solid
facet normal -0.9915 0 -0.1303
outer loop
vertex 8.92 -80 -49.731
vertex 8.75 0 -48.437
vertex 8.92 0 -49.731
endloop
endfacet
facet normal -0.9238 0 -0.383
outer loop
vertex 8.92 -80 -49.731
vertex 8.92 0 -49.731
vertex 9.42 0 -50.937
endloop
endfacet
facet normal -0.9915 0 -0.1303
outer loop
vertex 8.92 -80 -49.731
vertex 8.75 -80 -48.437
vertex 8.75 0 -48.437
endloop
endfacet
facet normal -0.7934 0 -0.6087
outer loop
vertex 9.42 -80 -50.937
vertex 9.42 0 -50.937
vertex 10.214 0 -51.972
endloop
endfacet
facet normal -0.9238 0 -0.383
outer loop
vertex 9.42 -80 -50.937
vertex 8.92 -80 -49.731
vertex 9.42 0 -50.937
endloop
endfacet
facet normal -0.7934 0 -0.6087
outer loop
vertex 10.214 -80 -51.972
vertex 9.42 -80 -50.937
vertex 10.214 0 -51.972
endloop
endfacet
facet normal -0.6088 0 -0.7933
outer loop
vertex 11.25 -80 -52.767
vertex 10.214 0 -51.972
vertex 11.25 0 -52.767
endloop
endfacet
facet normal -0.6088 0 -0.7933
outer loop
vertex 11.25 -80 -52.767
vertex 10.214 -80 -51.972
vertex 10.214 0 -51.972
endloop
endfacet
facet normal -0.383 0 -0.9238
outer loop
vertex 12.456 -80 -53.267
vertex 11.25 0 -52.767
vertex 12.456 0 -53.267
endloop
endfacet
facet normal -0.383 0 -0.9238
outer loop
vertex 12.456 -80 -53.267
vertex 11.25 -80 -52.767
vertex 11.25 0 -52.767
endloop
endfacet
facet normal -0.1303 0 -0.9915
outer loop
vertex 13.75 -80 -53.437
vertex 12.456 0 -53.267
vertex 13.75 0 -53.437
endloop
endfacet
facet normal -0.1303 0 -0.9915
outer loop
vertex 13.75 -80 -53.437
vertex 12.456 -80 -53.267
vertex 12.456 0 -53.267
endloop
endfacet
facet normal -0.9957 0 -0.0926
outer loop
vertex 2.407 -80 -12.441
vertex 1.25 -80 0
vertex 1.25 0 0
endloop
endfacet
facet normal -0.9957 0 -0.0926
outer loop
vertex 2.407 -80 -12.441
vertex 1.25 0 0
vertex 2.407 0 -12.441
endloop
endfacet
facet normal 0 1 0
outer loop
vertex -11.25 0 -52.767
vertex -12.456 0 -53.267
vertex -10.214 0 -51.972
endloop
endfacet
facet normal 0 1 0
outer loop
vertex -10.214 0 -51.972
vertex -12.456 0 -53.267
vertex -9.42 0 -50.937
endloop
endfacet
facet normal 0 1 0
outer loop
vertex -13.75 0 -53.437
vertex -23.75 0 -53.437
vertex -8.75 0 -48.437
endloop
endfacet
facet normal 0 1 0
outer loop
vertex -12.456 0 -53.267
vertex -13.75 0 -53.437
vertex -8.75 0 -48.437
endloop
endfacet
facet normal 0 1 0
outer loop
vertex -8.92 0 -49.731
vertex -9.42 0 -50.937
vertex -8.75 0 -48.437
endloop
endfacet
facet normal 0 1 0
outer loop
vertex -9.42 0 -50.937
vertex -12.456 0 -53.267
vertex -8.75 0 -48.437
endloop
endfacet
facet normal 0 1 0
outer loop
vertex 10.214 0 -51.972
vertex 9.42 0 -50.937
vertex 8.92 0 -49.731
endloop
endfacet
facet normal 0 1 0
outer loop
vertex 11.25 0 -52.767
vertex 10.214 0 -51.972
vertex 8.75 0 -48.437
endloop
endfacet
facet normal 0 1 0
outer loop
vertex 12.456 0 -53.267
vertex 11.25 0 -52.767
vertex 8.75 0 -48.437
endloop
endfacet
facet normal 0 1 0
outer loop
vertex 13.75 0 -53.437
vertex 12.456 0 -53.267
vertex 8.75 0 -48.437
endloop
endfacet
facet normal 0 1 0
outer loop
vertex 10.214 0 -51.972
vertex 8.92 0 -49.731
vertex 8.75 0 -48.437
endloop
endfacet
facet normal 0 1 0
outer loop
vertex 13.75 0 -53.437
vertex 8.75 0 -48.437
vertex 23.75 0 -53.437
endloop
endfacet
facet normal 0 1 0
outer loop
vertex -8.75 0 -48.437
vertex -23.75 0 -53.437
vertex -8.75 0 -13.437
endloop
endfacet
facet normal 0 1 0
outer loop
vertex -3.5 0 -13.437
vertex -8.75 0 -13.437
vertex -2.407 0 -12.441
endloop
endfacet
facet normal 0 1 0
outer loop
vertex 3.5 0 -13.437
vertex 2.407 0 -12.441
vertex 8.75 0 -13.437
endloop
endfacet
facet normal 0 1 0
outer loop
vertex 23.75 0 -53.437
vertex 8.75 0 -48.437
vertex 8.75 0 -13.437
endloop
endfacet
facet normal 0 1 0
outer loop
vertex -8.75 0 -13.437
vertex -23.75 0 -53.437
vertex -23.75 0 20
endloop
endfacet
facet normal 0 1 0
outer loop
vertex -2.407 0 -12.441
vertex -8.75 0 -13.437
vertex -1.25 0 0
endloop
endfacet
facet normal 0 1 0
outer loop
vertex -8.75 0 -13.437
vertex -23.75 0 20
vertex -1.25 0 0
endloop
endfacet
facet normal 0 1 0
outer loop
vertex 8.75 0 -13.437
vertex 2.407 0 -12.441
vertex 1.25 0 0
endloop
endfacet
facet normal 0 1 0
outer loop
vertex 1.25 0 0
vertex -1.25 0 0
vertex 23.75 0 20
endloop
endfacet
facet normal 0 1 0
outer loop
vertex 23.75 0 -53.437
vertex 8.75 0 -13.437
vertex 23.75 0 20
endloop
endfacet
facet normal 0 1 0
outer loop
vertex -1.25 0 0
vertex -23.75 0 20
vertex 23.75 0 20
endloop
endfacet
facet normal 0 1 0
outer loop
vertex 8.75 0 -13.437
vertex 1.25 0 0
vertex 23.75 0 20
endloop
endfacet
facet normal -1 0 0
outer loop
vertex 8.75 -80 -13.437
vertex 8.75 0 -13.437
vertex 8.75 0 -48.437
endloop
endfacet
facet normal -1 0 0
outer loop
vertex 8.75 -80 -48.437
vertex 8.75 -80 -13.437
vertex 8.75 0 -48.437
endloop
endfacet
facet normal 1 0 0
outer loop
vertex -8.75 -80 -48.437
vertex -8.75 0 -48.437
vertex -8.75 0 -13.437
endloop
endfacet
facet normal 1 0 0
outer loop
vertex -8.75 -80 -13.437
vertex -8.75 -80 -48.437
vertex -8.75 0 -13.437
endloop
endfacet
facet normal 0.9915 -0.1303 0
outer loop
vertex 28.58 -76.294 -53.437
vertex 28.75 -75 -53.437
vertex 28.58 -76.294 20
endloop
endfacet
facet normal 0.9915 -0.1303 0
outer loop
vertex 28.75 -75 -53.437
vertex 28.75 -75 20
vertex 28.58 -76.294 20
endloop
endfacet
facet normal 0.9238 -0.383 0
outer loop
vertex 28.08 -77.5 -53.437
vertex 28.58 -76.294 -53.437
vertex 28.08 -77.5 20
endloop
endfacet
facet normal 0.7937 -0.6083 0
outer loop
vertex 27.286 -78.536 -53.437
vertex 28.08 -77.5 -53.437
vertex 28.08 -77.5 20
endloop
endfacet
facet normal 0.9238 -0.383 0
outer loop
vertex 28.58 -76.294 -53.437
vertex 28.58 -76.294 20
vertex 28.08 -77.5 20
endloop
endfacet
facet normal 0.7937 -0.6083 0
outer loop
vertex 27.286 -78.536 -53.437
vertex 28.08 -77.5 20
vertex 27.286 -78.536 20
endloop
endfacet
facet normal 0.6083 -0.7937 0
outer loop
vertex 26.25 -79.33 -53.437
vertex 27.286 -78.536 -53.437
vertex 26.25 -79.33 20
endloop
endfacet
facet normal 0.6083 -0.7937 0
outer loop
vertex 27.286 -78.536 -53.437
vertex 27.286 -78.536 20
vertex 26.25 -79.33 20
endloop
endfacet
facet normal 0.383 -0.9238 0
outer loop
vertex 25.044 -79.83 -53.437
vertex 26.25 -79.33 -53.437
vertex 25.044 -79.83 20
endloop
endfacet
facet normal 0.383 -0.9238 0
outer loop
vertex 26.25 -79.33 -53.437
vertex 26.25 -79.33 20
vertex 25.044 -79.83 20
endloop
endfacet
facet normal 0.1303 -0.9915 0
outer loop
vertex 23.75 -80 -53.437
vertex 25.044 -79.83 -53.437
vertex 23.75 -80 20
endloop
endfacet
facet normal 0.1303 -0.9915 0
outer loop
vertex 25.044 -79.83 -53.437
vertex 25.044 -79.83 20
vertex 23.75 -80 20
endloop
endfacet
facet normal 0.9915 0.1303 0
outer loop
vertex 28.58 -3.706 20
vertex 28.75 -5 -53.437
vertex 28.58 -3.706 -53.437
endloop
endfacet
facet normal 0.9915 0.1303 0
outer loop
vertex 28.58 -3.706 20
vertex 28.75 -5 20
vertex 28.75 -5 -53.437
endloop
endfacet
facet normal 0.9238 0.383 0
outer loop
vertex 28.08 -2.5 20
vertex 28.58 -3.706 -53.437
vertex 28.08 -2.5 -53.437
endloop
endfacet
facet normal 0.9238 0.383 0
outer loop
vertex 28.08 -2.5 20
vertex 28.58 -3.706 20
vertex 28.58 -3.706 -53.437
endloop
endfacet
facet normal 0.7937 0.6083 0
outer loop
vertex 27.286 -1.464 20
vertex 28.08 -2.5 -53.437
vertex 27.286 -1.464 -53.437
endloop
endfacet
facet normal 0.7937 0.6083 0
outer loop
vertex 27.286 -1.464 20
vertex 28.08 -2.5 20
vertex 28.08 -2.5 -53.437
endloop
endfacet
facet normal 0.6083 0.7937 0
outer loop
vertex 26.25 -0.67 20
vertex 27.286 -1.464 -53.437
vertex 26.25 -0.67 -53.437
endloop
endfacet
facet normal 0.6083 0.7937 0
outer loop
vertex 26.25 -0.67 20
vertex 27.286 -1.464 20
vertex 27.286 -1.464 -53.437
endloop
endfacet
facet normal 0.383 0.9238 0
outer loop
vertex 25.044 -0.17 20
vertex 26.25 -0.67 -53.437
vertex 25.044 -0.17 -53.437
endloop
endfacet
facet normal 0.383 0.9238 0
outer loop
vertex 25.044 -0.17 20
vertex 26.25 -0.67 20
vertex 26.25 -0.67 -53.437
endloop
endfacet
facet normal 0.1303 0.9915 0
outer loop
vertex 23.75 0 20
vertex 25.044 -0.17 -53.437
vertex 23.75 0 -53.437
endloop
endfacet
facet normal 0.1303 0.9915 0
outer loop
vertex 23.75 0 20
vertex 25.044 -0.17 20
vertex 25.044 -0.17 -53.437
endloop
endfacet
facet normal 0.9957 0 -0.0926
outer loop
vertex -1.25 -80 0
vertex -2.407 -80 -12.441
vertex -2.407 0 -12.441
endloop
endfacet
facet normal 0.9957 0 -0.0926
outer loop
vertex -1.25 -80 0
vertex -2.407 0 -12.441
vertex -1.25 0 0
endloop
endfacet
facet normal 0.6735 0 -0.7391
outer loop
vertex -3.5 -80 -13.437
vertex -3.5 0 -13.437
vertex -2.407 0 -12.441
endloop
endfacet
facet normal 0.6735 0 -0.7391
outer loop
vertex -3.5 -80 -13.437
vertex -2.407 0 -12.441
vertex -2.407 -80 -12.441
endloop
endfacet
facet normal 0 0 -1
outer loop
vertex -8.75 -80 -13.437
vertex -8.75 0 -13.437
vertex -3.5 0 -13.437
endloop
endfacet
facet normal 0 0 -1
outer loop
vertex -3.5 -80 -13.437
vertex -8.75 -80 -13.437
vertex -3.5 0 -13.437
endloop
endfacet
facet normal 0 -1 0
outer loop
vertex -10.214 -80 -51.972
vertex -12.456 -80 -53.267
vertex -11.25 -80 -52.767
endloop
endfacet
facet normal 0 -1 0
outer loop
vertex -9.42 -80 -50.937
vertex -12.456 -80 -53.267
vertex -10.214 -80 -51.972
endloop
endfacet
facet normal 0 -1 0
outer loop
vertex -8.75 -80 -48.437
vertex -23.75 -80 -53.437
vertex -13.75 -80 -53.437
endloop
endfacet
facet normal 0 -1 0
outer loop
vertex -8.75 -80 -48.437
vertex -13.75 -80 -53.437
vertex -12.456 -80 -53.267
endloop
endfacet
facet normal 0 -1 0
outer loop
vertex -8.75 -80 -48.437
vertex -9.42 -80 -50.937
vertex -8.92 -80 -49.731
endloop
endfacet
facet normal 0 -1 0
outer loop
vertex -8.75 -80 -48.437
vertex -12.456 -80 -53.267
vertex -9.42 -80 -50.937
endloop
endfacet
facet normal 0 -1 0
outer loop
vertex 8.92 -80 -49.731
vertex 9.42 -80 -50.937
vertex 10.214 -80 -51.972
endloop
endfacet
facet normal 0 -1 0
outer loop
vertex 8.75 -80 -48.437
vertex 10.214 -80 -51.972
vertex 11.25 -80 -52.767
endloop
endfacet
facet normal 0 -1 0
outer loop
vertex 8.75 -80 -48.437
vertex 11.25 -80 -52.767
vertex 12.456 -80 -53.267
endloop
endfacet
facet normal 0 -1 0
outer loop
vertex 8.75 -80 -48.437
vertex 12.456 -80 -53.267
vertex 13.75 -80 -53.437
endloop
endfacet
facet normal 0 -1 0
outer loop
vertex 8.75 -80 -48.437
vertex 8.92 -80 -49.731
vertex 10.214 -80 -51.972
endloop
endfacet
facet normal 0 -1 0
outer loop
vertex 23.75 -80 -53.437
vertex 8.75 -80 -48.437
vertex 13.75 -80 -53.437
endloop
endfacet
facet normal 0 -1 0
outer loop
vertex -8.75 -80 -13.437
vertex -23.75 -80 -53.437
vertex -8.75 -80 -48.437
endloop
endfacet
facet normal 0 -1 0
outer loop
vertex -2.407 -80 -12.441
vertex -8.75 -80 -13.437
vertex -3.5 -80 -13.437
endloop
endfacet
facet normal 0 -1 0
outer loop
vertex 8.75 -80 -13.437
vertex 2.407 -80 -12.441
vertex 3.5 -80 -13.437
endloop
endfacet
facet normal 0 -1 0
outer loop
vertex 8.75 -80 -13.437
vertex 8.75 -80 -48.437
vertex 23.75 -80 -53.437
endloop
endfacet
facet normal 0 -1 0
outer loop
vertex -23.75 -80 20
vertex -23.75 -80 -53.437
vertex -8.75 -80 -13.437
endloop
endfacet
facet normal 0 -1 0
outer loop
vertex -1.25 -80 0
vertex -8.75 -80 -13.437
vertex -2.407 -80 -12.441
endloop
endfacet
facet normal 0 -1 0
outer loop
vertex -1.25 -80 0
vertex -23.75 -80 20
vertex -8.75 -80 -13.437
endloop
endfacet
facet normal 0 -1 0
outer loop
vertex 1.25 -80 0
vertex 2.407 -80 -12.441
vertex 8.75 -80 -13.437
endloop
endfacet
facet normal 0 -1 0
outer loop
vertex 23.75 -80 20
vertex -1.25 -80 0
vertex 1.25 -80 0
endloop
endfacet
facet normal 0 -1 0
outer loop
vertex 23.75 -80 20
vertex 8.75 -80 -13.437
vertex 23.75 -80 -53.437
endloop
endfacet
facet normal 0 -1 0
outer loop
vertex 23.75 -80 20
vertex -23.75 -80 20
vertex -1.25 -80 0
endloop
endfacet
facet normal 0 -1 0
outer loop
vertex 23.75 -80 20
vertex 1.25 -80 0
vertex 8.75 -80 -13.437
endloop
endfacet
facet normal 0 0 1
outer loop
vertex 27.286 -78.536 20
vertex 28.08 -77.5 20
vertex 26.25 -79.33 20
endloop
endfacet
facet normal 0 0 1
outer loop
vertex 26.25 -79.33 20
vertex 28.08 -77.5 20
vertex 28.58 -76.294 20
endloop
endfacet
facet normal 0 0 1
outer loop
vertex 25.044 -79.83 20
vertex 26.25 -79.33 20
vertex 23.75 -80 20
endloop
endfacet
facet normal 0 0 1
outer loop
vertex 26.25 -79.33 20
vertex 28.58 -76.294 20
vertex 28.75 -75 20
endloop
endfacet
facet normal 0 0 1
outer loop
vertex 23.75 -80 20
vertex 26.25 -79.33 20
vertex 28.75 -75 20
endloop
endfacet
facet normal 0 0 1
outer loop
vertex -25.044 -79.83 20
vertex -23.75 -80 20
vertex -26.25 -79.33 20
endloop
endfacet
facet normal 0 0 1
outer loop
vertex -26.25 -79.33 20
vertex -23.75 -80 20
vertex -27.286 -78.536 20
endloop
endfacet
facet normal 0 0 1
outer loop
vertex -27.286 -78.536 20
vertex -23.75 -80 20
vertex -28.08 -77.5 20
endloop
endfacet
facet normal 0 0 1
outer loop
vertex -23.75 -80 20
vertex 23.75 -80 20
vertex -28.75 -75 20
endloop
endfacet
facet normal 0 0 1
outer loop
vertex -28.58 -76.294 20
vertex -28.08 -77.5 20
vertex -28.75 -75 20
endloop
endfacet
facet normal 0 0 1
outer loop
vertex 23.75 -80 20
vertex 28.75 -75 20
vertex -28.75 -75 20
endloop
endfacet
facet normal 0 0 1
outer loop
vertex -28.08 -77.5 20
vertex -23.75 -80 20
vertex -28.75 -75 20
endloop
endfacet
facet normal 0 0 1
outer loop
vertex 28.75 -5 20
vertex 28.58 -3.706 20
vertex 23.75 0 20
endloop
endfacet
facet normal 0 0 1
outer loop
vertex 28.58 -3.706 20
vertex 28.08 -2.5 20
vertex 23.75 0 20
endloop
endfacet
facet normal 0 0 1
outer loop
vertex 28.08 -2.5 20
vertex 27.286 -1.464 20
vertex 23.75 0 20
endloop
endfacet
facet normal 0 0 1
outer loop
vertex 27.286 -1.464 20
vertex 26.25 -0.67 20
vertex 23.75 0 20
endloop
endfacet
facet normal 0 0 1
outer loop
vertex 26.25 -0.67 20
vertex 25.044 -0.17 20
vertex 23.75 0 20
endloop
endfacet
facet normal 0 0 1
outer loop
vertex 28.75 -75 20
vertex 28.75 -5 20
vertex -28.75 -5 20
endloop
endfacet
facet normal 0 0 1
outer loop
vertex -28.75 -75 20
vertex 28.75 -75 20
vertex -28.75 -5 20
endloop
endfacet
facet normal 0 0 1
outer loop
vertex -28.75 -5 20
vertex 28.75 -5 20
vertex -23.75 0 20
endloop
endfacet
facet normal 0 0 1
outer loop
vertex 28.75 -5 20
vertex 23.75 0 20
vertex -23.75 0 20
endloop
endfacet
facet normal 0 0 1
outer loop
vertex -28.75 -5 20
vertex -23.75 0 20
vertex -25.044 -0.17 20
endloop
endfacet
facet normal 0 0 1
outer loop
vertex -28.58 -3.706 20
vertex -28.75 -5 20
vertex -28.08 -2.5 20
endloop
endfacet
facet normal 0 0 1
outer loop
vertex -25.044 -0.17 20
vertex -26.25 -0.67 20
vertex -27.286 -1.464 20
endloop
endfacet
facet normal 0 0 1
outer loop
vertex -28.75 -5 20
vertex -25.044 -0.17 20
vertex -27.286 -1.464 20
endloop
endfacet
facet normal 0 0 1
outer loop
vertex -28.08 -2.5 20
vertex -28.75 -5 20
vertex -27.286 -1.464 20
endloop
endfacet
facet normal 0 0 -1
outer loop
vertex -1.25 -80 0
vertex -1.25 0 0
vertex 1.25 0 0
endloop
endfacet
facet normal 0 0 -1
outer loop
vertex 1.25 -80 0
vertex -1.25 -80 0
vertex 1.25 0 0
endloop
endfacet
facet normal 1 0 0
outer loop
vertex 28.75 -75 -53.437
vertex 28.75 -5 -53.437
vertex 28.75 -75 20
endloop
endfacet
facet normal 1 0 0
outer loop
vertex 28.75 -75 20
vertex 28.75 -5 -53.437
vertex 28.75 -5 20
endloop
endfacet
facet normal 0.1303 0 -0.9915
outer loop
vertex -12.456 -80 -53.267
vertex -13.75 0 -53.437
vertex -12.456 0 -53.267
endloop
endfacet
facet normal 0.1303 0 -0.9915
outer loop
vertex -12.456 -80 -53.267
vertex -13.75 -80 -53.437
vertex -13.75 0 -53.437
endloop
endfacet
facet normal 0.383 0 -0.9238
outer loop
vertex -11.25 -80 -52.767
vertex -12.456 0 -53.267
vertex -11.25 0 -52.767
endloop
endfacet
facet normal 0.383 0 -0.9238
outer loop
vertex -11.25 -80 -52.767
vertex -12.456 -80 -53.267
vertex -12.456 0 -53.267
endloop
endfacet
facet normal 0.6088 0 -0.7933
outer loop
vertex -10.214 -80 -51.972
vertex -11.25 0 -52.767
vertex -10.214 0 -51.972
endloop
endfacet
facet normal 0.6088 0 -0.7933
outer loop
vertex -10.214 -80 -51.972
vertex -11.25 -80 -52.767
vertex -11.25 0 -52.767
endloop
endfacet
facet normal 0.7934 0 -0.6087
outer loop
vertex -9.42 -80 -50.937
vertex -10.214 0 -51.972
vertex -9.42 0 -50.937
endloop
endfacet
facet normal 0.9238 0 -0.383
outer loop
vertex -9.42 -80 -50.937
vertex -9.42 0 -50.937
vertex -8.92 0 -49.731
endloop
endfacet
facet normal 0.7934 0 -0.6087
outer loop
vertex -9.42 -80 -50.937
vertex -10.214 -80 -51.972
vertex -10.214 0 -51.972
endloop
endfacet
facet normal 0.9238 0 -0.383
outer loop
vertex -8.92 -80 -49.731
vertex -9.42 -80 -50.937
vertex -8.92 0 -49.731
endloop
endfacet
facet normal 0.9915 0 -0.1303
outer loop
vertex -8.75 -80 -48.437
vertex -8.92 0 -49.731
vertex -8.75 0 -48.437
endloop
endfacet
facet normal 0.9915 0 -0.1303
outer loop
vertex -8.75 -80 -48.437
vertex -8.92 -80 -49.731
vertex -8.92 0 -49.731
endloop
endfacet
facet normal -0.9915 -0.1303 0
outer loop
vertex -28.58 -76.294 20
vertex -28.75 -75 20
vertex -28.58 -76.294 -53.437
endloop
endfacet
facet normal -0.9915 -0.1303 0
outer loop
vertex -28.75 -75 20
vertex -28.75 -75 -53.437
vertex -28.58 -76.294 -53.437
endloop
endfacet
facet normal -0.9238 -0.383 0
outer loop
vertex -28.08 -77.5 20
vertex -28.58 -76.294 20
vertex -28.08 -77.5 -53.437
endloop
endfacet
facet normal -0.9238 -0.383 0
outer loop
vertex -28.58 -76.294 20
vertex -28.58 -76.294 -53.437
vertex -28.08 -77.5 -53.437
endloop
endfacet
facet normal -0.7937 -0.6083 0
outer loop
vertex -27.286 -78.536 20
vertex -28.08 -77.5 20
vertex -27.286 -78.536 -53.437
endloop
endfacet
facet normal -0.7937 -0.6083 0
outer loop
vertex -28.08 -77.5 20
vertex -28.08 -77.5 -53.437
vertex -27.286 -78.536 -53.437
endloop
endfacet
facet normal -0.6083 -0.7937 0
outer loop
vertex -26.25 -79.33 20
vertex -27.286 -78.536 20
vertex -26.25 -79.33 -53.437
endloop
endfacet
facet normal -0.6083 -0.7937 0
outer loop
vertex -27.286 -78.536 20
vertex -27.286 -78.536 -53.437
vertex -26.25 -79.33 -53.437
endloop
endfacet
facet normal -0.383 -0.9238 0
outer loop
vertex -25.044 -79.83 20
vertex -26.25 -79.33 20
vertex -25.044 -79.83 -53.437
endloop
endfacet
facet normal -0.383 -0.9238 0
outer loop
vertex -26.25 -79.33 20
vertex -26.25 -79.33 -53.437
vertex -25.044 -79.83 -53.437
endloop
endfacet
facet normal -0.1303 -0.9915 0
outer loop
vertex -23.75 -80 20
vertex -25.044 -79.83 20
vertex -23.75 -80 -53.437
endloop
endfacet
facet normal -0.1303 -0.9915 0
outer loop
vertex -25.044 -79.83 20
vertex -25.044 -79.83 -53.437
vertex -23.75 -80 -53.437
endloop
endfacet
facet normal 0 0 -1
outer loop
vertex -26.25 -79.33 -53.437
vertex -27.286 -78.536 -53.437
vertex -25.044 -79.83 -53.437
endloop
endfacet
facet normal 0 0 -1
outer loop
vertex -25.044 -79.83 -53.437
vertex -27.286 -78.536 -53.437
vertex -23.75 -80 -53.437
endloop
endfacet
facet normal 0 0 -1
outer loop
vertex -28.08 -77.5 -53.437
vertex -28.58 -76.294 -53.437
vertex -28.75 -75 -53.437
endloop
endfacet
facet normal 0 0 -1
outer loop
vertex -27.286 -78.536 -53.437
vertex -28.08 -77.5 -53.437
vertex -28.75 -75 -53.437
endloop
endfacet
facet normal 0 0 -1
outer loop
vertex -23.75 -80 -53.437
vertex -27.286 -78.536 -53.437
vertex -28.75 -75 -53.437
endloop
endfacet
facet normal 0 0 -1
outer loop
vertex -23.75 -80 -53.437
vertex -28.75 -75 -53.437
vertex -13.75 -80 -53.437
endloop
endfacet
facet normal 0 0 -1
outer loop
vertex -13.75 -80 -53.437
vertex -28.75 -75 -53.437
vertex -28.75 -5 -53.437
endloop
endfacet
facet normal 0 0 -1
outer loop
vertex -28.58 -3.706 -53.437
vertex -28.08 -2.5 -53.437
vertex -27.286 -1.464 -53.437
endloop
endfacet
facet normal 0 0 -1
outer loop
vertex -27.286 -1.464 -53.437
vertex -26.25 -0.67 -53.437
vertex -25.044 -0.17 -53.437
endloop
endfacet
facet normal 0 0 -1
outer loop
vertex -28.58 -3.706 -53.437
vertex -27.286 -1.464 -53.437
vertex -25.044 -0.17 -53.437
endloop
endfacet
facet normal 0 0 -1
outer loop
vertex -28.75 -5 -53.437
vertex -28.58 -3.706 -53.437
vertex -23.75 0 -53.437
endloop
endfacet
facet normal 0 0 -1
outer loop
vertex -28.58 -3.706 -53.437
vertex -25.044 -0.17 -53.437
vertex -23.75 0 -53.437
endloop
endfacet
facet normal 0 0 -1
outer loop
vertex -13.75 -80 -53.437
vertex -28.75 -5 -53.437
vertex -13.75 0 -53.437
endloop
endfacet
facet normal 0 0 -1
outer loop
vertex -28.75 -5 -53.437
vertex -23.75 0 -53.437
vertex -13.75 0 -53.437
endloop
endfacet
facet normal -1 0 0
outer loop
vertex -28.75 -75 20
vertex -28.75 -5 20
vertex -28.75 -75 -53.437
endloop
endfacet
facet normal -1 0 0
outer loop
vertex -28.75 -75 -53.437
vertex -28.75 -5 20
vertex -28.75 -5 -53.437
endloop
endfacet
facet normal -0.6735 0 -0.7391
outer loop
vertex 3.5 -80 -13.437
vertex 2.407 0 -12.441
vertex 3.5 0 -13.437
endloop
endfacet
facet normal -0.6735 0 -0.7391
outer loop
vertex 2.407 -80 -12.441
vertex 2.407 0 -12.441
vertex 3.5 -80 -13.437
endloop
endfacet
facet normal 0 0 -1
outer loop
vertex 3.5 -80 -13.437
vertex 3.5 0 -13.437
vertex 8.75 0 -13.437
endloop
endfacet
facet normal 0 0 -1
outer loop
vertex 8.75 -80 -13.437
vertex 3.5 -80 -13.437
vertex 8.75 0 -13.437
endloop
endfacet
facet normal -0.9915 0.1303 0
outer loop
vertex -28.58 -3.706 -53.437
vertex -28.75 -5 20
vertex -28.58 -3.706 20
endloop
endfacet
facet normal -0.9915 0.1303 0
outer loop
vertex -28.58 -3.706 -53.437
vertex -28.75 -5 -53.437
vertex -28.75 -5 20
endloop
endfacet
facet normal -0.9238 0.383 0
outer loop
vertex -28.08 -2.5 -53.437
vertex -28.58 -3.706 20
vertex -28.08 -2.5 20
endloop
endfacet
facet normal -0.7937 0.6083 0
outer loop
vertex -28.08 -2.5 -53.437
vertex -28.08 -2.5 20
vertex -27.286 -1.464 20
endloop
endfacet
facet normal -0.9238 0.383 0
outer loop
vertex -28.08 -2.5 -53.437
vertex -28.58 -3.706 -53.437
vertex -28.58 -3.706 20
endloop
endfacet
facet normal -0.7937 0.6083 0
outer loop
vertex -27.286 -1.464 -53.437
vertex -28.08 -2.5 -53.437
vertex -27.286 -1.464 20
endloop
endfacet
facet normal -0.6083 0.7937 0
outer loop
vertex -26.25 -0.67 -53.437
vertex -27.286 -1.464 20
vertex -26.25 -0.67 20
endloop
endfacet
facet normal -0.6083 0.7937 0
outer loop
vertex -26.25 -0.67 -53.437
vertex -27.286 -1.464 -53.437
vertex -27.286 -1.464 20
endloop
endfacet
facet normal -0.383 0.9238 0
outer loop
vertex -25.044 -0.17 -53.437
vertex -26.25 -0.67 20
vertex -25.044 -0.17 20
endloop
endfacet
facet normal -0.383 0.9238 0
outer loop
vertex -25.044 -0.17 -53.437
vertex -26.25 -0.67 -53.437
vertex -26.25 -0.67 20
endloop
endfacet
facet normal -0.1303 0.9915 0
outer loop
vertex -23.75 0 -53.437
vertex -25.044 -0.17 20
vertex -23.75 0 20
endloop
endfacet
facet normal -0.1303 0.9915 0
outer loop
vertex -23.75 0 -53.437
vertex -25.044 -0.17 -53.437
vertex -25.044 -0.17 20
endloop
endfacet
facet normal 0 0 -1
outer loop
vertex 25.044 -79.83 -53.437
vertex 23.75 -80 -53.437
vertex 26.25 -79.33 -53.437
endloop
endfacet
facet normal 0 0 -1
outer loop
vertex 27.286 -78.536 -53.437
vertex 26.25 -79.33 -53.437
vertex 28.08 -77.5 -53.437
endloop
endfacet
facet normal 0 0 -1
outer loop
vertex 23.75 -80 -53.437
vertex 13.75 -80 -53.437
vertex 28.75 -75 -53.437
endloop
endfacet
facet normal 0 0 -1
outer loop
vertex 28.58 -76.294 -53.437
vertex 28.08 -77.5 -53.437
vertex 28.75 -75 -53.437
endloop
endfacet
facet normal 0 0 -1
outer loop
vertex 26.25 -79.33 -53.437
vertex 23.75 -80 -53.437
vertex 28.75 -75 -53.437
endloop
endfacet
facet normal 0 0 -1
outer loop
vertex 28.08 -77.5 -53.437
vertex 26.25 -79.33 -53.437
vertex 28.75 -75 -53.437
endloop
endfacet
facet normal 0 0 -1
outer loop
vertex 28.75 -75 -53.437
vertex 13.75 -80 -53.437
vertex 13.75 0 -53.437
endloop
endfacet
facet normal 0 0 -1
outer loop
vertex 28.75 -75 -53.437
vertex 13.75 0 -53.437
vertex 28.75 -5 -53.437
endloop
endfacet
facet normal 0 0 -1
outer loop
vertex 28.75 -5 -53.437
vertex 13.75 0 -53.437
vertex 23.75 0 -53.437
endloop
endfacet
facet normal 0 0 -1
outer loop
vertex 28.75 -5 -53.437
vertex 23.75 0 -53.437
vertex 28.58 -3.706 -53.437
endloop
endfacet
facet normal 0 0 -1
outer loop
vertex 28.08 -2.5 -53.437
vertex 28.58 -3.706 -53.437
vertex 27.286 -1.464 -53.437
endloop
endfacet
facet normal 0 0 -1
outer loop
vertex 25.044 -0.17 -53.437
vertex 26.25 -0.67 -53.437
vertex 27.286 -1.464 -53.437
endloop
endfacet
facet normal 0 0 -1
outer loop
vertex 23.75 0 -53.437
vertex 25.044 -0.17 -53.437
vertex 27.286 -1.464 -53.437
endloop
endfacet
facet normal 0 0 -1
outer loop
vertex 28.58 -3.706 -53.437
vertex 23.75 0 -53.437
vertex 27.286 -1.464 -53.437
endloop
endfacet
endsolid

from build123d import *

# Parameters (mm, degrees)
F1_DEPTH = 80
F2_R     = 5
F3_SIZE  = 1


with BuildPart() as f1:
    # F0 (on Front) → F1 (new body)
    with BuildSketch(Plane.XZ):
        Polygon((-1.25, 0), (0, 0), (1.25, 0), (2.5, -13.436909), (8.75, -13.436909), (8.75, -53.436909), (28.75, -53.436909), (28.75, 6.563091), (28.75, 20), (19.475808, 20), (0, 20), (-19.475808, 20), (-28.75, 20), (-28.75, 6.563091), (-28.75, -53.436909), (-8.75, -53.436909), (-8.75, -13.436909), (-2.5, -13.436909), align=None)
    extrude(amount=F1_DEPTH)

    # F2
    f2_edges = [f1.edges().sort_by_distance(p)[0] for p in [
        (28.75, -80, -16.718455),
        (-28.75, -80, -16.718455),
        (28.75, 0, -16.718455),
        (-8.75, -40, -53.436909),
        (8.75, -40, -53.436909),
        (-28.75, 0, -16.718455),
    ]]
    fillet(f2_edges, radius=F2_R)

    # F3
    f3_edges = [f1.edges().sort_by_distance(p)[0] for p in [
        (2.5, -40, -13.436909),
        (-2.5, -40, -13.436909),
    ]]
    chamfer(f3_edges, length=F3_SIZE)


solid = f1.part
